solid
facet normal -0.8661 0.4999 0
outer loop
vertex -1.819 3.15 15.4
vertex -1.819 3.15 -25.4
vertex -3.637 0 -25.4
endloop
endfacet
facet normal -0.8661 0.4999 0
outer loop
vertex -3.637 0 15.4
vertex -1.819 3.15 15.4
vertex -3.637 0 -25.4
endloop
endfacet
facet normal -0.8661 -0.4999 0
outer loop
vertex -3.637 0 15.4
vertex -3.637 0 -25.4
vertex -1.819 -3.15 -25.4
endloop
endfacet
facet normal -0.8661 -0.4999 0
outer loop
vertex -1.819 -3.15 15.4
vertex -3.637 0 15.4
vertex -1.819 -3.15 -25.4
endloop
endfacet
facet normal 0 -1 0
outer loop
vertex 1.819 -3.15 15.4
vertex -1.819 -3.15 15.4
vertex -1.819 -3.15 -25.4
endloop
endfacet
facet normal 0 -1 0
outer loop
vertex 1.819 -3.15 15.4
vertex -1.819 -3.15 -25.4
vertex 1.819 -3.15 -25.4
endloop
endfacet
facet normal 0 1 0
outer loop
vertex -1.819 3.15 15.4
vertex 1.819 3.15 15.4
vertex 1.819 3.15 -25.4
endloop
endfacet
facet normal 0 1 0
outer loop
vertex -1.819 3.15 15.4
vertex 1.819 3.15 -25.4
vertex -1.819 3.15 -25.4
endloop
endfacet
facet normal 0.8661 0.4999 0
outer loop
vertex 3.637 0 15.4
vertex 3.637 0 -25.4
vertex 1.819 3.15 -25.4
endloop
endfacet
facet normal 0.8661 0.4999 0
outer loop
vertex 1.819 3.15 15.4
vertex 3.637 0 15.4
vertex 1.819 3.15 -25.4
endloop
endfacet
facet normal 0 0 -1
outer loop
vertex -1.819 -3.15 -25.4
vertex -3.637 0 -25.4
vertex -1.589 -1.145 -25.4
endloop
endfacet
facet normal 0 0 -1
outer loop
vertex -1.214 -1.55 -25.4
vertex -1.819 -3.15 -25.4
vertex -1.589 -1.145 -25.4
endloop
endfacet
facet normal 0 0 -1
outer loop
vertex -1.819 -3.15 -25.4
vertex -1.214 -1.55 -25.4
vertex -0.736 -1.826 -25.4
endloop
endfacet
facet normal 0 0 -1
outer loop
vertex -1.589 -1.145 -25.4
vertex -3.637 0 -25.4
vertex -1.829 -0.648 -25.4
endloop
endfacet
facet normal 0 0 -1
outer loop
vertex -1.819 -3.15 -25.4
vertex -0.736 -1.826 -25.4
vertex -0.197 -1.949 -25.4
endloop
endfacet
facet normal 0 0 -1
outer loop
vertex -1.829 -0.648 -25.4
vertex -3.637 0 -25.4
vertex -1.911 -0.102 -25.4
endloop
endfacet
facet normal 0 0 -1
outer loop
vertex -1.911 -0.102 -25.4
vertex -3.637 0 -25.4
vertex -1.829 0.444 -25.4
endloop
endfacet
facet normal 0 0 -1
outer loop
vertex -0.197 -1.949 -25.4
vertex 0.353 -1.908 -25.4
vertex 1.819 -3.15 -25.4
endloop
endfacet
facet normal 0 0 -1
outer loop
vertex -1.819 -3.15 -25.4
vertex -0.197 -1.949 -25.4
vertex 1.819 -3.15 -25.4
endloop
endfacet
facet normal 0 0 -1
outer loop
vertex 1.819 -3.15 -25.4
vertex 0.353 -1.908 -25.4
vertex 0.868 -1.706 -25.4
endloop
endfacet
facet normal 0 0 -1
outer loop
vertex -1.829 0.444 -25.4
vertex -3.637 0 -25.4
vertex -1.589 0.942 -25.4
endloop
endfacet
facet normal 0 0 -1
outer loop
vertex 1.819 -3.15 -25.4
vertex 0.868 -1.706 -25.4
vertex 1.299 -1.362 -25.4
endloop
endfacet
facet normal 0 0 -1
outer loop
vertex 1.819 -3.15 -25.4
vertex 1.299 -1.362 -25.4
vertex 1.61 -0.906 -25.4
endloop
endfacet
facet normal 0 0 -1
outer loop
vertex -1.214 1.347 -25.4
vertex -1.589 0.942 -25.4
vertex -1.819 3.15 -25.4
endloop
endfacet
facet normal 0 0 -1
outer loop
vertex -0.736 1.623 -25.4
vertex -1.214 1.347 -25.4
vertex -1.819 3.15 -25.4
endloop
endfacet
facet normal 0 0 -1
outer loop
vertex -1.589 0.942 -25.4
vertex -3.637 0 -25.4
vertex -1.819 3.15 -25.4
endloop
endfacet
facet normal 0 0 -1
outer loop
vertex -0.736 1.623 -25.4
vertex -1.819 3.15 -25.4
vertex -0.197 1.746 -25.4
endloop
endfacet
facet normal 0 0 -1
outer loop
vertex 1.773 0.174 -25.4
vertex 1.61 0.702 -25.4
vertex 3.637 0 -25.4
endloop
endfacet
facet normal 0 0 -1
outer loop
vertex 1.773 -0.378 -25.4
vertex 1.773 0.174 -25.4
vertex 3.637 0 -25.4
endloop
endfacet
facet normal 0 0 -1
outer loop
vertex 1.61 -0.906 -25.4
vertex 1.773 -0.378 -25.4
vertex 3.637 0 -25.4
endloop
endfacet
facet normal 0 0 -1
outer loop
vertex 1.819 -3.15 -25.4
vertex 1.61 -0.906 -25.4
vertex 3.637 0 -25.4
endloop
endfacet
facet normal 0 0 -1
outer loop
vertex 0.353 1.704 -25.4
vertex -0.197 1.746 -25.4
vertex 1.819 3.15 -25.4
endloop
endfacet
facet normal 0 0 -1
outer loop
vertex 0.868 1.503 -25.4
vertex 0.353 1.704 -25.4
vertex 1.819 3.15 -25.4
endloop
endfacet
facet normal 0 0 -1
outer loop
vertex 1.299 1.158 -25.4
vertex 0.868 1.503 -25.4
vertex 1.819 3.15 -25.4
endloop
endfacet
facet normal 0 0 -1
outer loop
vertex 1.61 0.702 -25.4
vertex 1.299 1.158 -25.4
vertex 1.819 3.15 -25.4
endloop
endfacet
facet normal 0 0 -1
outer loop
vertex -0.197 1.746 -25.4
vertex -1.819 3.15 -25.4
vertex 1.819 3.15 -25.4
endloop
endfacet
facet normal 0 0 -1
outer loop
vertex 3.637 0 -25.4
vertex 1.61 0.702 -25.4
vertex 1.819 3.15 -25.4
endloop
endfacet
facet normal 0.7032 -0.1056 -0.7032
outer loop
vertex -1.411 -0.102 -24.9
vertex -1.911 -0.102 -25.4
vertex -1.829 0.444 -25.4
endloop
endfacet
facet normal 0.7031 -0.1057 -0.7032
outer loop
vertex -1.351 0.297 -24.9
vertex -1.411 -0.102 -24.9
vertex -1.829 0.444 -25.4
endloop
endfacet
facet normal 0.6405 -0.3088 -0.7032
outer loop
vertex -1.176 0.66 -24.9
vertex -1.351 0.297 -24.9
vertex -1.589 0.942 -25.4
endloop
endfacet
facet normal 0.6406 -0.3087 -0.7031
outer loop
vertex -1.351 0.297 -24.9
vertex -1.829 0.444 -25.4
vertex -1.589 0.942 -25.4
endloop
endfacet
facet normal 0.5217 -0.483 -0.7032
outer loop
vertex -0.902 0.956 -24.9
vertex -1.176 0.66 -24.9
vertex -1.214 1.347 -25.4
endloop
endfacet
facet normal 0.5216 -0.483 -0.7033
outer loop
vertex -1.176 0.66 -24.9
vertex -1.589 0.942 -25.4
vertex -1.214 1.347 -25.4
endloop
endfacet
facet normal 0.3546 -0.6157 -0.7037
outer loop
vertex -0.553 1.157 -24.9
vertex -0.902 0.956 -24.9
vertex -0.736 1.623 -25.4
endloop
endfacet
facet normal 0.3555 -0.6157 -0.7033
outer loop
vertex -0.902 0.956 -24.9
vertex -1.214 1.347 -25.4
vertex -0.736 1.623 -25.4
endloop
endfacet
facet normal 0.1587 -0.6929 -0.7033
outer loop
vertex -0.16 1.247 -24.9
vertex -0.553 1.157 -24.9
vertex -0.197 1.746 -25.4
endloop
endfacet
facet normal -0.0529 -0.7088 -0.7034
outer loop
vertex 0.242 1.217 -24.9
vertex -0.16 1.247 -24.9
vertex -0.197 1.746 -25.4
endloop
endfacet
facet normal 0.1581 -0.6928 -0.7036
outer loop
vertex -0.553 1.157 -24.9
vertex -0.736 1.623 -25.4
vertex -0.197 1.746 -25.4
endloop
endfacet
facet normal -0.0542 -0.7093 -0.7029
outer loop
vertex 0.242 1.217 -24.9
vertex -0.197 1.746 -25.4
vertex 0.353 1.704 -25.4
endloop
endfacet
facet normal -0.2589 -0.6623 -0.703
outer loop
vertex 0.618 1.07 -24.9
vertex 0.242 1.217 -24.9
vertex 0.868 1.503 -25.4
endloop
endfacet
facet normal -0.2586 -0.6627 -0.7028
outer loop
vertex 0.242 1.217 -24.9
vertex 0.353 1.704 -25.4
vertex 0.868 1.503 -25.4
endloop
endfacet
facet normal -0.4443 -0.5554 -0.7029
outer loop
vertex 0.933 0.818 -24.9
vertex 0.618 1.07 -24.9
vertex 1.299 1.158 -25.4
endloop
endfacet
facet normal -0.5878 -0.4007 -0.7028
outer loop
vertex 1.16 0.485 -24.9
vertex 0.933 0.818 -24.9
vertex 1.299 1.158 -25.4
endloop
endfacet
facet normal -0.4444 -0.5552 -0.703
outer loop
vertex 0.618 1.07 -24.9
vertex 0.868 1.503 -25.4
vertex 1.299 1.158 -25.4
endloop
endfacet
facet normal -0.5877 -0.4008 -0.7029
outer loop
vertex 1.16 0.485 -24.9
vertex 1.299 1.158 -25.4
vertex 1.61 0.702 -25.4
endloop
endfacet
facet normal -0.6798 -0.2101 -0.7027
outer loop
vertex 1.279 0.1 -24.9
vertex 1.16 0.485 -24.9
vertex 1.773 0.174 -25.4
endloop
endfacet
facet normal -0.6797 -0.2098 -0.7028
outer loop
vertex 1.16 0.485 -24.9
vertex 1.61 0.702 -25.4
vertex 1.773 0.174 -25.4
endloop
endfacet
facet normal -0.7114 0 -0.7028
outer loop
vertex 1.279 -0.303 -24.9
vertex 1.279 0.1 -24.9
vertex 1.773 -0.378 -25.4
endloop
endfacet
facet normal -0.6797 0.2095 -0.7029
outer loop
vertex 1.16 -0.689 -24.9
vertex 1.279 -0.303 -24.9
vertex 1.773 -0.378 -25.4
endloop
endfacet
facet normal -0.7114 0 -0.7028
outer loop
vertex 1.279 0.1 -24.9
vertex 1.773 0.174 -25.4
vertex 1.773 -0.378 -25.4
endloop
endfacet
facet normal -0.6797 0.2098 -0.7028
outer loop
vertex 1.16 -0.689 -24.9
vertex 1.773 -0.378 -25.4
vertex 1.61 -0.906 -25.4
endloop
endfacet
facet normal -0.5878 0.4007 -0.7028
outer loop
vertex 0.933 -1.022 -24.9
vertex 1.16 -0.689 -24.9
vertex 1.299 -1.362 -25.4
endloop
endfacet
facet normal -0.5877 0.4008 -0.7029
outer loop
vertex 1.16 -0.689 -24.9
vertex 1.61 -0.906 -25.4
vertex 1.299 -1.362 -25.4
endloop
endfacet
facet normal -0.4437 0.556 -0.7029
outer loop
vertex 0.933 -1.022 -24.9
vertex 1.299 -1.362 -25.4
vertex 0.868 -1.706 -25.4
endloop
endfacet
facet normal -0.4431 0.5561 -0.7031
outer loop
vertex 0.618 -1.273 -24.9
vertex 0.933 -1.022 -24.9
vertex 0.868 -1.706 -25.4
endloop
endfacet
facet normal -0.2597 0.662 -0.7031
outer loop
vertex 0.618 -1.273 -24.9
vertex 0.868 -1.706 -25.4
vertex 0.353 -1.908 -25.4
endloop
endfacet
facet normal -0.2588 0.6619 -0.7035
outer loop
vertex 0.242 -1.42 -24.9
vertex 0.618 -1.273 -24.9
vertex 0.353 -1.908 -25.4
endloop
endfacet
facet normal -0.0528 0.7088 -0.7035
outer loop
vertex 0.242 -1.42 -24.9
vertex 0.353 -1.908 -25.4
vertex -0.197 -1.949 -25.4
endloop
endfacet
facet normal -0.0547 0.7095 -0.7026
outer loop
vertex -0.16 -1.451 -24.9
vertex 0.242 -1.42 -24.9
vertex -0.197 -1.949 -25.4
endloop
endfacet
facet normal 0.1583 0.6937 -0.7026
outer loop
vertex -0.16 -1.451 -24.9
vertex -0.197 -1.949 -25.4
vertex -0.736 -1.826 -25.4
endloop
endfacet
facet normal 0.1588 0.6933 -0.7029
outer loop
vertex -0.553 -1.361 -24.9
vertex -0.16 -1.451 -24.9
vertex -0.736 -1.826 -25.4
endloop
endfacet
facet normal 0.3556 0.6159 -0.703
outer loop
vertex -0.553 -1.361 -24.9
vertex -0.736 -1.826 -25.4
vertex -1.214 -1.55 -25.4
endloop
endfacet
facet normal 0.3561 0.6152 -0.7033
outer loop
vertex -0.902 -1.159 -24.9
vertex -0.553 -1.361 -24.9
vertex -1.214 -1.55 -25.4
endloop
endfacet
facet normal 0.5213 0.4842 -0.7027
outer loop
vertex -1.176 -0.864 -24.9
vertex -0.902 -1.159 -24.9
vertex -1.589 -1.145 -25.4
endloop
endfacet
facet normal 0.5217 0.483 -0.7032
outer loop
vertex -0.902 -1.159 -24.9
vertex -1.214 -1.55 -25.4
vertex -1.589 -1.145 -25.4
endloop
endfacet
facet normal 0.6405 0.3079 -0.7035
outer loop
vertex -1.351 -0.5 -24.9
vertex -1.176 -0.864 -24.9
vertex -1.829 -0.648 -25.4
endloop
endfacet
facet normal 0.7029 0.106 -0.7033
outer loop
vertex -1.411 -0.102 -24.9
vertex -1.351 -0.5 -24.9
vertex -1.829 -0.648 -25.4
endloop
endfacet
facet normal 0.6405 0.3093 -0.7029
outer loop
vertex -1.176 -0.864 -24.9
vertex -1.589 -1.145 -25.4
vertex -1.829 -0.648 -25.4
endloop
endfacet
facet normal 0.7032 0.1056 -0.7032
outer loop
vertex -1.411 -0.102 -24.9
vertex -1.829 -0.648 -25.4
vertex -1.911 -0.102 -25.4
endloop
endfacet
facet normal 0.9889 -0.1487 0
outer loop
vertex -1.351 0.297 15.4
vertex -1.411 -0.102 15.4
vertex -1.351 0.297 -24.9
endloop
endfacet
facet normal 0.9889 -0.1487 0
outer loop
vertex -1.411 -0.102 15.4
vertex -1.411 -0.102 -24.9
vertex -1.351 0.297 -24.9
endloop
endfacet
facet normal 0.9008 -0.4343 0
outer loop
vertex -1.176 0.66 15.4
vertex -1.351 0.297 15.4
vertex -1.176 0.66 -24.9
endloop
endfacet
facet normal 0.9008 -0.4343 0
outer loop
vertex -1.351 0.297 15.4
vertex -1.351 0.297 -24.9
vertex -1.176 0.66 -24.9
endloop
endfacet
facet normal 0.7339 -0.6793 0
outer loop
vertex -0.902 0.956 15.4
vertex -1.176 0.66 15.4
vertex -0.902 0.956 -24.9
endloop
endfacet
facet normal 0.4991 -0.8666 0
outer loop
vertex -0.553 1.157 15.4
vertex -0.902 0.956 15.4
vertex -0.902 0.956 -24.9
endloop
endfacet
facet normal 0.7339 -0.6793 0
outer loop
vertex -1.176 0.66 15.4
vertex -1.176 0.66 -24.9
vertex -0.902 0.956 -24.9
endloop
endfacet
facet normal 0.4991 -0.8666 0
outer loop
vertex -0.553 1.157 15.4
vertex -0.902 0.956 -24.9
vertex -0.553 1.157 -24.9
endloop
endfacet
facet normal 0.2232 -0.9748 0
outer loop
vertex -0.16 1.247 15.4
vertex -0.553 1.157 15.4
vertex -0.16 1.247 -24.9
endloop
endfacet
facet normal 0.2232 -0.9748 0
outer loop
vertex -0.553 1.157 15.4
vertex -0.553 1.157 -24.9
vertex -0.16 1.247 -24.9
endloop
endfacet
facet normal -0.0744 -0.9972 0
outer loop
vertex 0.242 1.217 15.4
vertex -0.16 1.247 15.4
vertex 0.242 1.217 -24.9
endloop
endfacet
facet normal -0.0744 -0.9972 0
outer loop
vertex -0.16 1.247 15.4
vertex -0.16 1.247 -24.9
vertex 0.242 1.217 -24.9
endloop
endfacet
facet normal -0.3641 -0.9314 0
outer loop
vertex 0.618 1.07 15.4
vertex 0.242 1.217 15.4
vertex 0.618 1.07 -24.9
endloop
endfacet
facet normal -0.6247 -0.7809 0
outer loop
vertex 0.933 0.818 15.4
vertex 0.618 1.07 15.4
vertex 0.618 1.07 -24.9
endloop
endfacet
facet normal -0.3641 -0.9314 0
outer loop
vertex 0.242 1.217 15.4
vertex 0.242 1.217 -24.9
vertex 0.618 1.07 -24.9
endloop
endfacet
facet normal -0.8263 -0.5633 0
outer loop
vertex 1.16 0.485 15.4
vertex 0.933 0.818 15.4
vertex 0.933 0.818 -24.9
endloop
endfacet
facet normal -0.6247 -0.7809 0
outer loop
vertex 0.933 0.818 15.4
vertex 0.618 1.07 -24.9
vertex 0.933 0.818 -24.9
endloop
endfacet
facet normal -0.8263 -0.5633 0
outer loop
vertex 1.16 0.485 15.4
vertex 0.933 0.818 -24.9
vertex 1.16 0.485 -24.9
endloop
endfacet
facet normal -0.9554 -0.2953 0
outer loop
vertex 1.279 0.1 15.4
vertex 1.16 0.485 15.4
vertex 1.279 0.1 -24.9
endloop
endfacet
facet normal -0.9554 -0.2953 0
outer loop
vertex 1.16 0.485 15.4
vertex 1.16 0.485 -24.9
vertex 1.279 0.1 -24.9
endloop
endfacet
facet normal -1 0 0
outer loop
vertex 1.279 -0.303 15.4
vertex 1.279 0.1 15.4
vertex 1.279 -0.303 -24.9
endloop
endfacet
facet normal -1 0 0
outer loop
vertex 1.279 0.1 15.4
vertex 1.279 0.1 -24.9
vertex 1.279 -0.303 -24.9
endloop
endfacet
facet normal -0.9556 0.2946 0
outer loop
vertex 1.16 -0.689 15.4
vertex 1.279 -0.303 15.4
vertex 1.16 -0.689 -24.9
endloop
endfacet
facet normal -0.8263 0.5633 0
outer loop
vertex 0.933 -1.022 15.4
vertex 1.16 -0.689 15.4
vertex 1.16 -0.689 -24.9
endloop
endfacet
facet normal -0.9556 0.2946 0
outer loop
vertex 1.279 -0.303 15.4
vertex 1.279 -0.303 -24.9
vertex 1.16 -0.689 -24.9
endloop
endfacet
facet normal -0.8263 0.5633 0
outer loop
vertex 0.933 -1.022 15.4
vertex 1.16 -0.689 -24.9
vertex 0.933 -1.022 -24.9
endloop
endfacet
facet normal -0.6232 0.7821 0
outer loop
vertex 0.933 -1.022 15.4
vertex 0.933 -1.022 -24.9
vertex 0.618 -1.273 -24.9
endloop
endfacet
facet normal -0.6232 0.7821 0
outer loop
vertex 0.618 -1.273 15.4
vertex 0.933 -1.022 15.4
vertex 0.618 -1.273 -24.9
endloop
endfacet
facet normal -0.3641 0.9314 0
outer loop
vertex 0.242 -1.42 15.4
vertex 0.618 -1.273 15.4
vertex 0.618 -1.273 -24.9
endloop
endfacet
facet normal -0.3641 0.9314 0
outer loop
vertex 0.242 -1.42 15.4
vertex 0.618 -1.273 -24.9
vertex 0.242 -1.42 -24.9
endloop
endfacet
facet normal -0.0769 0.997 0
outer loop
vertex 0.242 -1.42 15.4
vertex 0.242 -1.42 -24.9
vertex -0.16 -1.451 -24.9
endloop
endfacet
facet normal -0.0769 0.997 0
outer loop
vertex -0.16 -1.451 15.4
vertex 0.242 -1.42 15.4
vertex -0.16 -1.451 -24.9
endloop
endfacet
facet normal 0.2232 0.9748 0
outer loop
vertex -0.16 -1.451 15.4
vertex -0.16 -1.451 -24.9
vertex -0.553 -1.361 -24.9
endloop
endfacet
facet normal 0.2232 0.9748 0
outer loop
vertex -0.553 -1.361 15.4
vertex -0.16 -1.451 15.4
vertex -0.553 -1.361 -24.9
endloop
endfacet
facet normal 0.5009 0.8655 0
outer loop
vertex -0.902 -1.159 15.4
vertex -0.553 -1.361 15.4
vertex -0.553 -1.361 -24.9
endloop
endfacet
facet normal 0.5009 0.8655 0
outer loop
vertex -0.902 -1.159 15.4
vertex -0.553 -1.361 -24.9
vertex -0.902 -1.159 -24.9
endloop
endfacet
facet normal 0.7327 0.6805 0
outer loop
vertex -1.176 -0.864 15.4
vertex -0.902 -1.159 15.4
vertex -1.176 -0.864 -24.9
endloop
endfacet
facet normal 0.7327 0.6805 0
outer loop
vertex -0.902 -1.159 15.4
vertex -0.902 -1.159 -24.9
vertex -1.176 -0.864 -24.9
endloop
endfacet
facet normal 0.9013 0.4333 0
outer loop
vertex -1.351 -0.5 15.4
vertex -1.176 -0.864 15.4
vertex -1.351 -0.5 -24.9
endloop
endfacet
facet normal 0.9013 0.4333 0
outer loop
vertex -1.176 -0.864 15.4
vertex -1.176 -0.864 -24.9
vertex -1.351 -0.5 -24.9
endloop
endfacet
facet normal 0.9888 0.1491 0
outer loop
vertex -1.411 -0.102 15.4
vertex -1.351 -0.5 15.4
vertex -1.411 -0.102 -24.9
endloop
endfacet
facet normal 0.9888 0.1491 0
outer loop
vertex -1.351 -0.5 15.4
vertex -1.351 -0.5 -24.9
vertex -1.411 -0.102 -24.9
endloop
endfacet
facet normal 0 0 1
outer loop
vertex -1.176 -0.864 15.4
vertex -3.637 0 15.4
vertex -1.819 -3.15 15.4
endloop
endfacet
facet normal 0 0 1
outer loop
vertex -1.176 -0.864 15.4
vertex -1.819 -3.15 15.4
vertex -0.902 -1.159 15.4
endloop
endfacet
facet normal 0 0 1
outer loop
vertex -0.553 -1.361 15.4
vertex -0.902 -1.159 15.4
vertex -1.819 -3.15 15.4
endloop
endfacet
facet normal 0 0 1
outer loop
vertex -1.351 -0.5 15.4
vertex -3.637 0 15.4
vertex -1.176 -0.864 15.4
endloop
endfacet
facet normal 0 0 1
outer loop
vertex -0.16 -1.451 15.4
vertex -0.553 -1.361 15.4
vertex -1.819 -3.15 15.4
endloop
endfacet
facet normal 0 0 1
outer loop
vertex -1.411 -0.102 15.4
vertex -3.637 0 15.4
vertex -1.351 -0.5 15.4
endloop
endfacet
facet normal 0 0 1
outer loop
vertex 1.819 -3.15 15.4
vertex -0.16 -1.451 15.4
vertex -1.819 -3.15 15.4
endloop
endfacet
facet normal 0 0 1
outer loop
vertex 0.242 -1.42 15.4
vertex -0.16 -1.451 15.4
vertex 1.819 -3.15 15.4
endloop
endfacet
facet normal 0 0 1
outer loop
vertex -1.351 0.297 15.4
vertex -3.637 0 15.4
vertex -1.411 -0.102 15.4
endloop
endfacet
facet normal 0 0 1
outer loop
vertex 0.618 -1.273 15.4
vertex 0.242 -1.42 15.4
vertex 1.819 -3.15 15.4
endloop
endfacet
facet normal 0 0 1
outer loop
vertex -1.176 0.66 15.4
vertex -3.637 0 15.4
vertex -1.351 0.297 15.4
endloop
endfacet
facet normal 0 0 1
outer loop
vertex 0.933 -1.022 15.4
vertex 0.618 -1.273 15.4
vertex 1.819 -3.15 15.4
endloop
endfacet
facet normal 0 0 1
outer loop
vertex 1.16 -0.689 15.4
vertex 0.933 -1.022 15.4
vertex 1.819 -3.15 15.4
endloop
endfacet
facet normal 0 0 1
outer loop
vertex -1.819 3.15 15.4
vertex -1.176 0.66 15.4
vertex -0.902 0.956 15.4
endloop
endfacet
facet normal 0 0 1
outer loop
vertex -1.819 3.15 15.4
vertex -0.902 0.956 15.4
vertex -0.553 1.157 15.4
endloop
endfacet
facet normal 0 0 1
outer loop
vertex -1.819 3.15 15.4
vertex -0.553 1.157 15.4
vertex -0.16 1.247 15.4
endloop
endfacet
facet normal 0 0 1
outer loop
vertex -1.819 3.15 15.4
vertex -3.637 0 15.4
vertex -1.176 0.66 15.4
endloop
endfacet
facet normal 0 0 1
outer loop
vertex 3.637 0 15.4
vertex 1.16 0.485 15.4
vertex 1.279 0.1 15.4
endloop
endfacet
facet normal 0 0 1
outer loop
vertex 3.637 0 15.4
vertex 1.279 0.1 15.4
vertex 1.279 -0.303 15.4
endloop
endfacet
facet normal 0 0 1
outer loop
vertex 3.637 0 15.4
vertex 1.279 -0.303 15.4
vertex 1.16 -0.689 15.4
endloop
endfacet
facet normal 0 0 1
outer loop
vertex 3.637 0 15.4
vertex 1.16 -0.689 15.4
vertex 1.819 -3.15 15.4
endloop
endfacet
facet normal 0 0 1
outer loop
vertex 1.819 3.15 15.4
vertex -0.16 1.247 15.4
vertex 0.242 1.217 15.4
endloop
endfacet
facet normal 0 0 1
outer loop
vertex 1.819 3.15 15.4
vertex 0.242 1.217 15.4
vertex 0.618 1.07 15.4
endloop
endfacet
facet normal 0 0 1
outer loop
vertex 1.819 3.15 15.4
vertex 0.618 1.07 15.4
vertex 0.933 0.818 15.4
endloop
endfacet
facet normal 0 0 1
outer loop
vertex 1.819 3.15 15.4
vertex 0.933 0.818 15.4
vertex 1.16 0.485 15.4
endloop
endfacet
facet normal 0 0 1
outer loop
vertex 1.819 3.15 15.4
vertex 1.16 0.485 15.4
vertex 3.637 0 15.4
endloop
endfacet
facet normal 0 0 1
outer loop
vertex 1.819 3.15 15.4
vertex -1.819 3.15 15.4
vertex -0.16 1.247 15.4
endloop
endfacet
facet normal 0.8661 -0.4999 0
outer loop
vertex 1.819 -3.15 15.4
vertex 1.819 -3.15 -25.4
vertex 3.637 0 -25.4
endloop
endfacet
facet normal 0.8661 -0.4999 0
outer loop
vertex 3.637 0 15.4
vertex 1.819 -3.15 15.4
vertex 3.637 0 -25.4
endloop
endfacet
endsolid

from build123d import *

# Parameters (mm, degrees)
BOSS_EXTRUDE1_DEPTH   = 25.4
F_6_32_TAPPED_HOLE8_D = 2.7051
CHAMFER1_SIZE         = 0.5
CHAMFER2_SIZE         = 0.5
CUT_EXTRUDE2_START    = 25.4
CUT_EXTRUDE2_DEPTH    = 10


with BuildPart() as part:
    # Sketch1 → Boss-Extrude1 (new, symmetric)
    with BuildSketch(Plane.XY):
        Polygon((3.637306696, 0), (1.818653348, 3.15), (-1.818653348, 3.15), (-3.637306696, 0), (-1.818653348, -3.15), (1.818653348, -3.15), align=None)
    extrude(amount=BOSS_EXTRUDE1_DEPTH, both=True)

    # #6-32 Tapped Hole8 (through all)
    with Locations(Plane(origin=(-0.058753338, -0.101763766, 25.4), x_dir=(1, 0, 0), z_dir=(0, 0, 1))):
        with Locations((0, 0)):
            Hole(F_6_32_TAPPED_HOLE8_D / 2)

    # Chamfer1
    chamfer1_edges = [part.edges().sort_by_distance(p)[0] for p in [
        (1.293796662, -0.101763766, 25.4),
    ]]
    chamfer(chamfer1_edges, length=CHAMFER1_SIZE)

    # Chamfer2
    chamfer2_edges = [part.edges().sort_by_distance(p)[0] for p in [
        (1.293796662, -0.101763766, -25.4),
    ]]
    chamfer(chamfer2_edges, length=CHAMFER2_SIZE)

    # Sketch1<2> → Cut-Extrude2 (cut)
    with BuildSketch(Plane.XY.offset(CUT_EXTRUDE2_START)):
        Polygon((3.637306696, 0), (1.818653348, 3.15), (-1.818653348, 3.15), (-3.637306696, 0), (-1.818653348, -3.15), (1.818653348, -3.15), align=None)
    extrude(amount=-CUT_EXTRUDE2_DEPTH, mode=Mode.SUBTRACT)


solid = part.part
